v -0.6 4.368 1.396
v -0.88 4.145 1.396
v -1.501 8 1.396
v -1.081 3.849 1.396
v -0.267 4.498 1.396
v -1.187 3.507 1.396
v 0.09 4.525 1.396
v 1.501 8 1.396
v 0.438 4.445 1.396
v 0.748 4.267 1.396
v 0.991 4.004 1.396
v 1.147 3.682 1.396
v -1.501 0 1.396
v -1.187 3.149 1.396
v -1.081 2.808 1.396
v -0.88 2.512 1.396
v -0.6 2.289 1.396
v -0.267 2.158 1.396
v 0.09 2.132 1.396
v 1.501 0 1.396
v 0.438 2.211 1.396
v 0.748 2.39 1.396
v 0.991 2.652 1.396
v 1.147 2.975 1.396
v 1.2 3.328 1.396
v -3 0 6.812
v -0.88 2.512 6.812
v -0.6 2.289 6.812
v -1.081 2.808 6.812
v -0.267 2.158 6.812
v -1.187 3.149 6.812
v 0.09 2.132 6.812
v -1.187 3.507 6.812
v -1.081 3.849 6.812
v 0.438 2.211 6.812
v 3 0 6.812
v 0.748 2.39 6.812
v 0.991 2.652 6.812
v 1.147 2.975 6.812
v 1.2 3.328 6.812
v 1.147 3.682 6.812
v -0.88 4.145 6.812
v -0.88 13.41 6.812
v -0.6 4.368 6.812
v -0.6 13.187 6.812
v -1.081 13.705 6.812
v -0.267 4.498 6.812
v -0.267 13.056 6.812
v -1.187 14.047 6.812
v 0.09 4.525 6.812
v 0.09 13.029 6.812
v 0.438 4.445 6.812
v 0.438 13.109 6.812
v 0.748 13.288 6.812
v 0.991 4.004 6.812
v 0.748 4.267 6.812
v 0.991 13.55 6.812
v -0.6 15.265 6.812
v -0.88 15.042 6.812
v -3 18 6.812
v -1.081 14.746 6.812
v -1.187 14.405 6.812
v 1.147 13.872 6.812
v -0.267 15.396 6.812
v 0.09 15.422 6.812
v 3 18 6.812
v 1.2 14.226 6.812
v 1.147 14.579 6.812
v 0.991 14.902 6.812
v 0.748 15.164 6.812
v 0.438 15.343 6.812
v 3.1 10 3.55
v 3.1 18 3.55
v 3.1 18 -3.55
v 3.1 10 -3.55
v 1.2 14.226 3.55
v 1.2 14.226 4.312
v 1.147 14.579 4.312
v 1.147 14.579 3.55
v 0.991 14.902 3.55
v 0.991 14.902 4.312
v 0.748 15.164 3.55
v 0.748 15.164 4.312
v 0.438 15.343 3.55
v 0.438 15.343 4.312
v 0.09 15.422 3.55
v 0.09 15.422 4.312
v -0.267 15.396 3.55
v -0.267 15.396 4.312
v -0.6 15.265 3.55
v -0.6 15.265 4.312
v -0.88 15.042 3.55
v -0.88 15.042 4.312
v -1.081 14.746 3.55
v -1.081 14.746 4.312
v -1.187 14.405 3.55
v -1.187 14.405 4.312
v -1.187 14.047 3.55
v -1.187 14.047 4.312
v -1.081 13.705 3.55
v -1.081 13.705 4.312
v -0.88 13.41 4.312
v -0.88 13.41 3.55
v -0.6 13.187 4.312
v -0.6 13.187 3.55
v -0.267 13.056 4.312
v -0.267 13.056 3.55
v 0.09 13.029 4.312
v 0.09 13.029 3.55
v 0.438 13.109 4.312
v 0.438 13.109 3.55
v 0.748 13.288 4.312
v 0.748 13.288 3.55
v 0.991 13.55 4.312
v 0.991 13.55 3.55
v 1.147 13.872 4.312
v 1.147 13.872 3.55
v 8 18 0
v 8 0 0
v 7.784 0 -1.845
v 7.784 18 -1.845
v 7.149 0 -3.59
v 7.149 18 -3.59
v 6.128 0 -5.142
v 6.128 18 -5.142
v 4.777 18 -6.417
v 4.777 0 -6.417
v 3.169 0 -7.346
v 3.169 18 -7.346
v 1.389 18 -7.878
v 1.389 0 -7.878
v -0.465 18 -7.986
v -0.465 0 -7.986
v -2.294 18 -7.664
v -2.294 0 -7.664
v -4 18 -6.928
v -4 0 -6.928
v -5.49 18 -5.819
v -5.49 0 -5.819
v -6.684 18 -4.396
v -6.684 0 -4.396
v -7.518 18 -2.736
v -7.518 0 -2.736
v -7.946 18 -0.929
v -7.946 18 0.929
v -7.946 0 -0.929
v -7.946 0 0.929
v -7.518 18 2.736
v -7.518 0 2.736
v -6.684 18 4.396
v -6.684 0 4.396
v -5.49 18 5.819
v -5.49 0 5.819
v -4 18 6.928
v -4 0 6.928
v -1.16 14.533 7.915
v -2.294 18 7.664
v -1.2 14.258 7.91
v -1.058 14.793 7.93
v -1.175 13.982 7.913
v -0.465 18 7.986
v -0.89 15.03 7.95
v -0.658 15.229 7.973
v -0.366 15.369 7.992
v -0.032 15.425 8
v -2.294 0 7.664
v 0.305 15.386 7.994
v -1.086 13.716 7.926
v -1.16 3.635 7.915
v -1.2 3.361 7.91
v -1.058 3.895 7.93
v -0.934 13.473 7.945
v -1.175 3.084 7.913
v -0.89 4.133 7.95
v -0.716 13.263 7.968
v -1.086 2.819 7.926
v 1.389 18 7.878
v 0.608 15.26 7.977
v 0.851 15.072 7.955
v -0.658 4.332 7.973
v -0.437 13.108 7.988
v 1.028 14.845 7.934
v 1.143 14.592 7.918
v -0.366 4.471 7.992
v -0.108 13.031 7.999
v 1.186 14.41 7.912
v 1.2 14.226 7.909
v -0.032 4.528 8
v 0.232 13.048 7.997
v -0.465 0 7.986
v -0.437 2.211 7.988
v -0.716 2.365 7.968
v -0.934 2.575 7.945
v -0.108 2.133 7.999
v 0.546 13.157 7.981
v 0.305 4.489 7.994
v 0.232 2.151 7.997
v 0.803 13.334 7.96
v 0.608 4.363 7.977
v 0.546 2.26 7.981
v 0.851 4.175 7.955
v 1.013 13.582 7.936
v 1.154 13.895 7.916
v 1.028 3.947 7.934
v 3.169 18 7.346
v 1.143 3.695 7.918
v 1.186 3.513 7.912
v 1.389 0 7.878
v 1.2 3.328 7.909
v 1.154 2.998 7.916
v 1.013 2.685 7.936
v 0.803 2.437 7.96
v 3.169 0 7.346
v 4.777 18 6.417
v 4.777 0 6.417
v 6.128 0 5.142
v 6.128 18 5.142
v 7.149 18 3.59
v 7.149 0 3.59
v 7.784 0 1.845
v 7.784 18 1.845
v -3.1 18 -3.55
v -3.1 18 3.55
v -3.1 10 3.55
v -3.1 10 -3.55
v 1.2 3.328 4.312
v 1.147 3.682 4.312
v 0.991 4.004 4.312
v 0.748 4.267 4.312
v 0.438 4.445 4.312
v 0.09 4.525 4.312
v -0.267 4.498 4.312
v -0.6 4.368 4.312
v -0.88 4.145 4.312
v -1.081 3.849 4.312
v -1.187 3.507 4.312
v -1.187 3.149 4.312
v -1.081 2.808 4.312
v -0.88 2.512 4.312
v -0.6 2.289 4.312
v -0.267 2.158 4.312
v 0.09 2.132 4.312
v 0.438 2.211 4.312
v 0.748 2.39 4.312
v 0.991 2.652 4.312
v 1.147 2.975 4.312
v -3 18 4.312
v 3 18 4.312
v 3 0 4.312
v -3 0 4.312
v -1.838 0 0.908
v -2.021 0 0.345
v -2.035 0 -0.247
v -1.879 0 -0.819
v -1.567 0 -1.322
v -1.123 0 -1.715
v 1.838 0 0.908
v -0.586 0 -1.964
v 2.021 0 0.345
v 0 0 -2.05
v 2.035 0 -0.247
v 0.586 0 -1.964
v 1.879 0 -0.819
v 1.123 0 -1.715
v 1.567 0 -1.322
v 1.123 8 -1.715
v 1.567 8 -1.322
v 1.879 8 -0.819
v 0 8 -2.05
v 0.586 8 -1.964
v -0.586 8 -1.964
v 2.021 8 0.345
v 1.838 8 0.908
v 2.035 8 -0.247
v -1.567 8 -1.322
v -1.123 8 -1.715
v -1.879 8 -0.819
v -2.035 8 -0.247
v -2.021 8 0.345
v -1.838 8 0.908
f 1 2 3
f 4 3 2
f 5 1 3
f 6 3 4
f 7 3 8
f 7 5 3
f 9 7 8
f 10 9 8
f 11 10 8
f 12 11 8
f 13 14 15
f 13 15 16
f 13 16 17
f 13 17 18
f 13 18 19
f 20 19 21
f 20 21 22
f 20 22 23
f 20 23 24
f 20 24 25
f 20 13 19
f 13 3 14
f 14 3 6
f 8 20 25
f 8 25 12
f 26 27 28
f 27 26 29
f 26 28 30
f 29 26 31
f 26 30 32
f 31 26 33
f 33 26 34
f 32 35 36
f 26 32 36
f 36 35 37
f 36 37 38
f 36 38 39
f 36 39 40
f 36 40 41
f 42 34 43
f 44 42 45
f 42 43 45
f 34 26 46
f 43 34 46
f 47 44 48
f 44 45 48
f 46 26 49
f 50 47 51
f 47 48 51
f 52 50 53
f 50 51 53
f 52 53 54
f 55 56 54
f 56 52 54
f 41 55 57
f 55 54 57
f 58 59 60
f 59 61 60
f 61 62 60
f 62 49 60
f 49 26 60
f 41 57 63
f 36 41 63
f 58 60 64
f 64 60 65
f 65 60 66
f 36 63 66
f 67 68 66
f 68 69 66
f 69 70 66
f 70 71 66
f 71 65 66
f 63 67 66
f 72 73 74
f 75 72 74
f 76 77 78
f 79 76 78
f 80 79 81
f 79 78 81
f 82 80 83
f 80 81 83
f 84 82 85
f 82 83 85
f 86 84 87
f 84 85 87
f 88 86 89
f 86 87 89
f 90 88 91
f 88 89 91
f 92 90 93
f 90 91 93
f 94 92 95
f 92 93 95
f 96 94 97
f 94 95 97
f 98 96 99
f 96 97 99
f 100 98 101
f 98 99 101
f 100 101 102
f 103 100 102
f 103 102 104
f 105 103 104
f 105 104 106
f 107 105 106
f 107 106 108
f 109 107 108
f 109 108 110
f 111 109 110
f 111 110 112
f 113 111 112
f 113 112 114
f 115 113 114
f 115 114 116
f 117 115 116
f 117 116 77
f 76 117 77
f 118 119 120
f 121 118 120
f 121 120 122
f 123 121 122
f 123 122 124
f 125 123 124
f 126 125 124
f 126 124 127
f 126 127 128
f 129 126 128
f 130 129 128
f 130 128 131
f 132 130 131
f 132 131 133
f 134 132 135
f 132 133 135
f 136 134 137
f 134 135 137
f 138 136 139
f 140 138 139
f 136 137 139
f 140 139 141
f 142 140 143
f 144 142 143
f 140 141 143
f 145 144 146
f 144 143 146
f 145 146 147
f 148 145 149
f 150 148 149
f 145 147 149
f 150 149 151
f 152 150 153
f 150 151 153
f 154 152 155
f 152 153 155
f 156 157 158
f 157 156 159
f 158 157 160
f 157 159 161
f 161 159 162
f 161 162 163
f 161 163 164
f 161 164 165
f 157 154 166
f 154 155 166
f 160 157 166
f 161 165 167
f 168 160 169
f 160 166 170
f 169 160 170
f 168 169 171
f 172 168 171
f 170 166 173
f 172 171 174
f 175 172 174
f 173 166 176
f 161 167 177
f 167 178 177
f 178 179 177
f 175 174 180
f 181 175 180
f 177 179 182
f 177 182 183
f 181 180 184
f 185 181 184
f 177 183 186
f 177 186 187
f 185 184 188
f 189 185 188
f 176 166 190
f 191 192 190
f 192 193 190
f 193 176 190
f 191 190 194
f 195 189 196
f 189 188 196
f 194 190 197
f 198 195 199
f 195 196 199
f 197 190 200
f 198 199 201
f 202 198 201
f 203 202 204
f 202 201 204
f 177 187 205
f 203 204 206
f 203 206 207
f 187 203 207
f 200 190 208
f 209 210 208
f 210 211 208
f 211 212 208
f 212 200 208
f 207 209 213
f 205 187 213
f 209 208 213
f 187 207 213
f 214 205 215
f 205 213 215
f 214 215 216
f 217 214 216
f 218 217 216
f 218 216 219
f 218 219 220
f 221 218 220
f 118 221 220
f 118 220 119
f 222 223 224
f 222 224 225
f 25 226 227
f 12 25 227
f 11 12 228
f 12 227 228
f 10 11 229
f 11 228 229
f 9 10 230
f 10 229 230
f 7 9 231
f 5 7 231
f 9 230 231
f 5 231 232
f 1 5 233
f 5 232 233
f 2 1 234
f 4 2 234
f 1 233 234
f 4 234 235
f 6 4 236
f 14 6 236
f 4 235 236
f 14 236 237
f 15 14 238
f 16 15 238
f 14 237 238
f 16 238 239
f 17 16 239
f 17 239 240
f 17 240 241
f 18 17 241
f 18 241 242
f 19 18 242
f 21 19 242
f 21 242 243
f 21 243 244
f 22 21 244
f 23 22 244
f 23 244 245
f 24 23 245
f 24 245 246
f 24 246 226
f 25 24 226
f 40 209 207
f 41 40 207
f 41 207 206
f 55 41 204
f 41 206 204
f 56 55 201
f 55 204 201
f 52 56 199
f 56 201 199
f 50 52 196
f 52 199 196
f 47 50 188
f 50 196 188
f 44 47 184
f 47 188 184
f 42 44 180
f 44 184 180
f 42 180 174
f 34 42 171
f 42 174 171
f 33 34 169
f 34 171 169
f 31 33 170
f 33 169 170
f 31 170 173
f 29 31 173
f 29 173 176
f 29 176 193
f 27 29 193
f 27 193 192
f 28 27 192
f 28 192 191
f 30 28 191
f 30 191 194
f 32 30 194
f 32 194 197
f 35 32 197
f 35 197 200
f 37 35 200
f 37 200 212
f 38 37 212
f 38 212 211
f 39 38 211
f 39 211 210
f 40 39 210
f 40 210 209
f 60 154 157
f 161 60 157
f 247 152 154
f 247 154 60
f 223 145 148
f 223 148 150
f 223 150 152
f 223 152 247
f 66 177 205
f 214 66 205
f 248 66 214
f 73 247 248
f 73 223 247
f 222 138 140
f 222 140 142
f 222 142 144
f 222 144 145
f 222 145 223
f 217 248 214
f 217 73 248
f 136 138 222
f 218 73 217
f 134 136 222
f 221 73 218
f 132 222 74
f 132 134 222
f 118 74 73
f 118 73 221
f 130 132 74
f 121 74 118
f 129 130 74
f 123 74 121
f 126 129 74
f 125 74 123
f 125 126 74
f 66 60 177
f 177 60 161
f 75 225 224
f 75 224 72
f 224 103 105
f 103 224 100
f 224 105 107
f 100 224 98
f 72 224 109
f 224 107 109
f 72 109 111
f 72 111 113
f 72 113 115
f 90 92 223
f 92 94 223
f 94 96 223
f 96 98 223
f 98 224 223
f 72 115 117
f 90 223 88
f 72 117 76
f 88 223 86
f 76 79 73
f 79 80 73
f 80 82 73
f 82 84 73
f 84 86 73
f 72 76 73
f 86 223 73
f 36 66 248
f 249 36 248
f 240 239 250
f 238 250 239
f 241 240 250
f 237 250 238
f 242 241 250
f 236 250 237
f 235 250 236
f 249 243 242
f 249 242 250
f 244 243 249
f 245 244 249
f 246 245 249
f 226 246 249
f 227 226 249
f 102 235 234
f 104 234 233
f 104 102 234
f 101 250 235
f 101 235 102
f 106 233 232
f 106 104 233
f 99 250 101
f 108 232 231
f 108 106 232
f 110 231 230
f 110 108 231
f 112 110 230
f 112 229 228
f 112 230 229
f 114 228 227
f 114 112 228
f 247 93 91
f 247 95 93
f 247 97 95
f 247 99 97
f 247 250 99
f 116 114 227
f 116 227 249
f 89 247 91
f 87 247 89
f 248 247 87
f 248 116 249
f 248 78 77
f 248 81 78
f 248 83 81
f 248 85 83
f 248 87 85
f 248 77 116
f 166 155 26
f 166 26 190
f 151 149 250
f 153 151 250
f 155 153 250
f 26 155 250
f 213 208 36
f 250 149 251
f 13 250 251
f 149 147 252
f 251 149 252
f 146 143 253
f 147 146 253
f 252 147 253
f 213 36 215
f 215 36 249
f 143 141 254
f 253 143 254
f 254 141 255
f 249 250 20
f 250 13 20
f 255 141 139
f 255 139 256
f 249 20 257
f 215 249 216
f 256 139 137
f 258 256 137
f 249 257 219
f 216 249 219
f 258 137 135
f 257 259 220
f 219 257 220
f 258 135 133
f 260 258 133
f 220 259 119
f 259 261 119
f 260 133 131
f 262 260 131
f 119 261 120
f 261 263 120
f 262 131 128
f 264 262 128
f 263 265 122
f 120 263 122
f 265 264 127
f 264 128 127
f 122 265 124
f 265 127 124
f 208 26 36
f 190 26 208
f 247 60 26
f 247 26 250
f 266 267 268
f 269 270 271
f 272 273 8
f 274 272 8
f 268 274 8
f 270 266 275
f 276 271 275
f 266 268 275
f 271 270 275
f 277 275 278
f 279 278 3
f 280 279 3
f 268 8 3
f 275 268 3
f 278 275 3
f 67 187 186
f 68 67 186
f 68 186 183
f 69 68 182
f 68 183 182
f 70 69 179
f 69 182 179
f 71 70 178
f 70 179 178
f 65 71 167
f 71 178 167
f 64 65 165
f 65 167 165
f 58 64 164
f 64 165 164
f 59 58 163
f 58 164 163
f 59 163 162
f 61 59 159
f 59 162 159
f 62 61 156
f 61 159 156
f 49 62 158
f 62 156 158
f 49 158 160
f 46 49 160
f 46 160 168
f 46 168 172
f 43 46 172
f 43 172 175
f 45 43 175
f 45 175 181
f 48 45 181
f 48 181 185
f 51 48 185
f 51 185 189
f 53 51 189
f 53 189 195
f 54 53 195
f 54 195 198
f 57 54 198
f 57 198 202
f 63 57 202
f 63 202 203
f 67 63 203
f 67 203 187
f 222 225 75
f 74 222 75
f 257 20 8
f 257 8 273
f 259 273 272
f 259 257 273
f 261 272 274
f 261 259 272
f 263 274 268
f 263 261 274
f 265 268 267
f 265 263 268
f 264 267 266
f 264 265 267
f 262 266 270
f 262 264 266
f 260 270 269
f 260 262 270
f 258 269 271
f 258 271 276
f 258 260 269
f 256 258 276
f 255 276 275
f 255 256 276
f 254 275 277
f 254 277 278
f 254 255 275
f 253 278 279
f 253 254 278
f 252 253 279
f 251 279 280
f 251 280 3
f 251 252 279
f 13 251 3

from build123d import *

# Parameters (mm, degrees)
SKETCH1_R           = 8
BOSS_EXTRUDE1_DEPTH = 18
CUT_EXTRUDE1_DEPTH  = 8
SKETCH3_W           = 6.2
SKETCH3_H           = 7.1
CUT_EXTRUDE2_DEPTH  = 8
SKETCH4_W           = 6
SKETCH4_H           = 2.5
CUT_EXTRUDE3_DEPTH  = 20
SKETCH5_R           = 1.2
CUT_EXTRUDE4_DEPTH  = 9


with BuildPart() as part:
    # Sketch1 → Boss-Extrude1 (new body)
    with BuildSketch(Plane(origin=(0, 0, 0), x_dir=(1, 0, 0), z_dir=(0, 1, 0))):
        Circle(SKETCH1_R)
    extrude(amount=BOSS_EXTRUDE1_DEPTH)

    # Sketch2 → Cut-Extrude1 (cut)
    with BuildSketch(Plane.XZ):
        with BuildLine():
            Line((-1.501271778, 1.395952381), (1.501271778, 1.395952381))
            ThreePointArc((1.501271778, 1.395952381), (0, -2.05), (-1.501271778, 1.395952381))
        make_face()
    extrude(amount=-CUT_EXTRUDE1_DEPTH, mode=Mode.SUBTRACT)

    # Sketch3 → Cut-Extrude2 (cut)
    with BuildSketch(Plane(origin=(0, 18, 0), x_dir=(1, 0, 0), z_dir=(0, 1, 0))):
        Rectangle(SKETCH3_W, SKETCH3_H)
    extrude(amount=-CUT_EXTRUDE2_DEPTH, mode=Mode.SUBTRACT)

    # Sketch4 → Cut-Extrude3 (cut)
    with BuildSketch(Plane(origin=(0, 18, 0), x_dir=(1, 0, 0), z_dir=(0, 1, 0))):
        with Locations((0, -5.561582467)):
            Rectangle(SKETCH4_W, SKETCH4_H)
    extrude(amount=-CUT_EXTRUDE3_DEPTH, mode=Mode.SUBTRACT)

    # Sketch5 → Cut-Extrude4 (cut)
    with BuildSketch(Plane.XY.offset(8)):
        with Locations((0, 3.328333926)):
            Circle(SKETCH5_R)
        with Locations((0, 14.225763094)):
            Circle(SKETCH5_R)
    extrude(amount=-CUT_EXTRUDE4_DEPTH, mode=Mode.SUBTRACT)


solid = part.part
